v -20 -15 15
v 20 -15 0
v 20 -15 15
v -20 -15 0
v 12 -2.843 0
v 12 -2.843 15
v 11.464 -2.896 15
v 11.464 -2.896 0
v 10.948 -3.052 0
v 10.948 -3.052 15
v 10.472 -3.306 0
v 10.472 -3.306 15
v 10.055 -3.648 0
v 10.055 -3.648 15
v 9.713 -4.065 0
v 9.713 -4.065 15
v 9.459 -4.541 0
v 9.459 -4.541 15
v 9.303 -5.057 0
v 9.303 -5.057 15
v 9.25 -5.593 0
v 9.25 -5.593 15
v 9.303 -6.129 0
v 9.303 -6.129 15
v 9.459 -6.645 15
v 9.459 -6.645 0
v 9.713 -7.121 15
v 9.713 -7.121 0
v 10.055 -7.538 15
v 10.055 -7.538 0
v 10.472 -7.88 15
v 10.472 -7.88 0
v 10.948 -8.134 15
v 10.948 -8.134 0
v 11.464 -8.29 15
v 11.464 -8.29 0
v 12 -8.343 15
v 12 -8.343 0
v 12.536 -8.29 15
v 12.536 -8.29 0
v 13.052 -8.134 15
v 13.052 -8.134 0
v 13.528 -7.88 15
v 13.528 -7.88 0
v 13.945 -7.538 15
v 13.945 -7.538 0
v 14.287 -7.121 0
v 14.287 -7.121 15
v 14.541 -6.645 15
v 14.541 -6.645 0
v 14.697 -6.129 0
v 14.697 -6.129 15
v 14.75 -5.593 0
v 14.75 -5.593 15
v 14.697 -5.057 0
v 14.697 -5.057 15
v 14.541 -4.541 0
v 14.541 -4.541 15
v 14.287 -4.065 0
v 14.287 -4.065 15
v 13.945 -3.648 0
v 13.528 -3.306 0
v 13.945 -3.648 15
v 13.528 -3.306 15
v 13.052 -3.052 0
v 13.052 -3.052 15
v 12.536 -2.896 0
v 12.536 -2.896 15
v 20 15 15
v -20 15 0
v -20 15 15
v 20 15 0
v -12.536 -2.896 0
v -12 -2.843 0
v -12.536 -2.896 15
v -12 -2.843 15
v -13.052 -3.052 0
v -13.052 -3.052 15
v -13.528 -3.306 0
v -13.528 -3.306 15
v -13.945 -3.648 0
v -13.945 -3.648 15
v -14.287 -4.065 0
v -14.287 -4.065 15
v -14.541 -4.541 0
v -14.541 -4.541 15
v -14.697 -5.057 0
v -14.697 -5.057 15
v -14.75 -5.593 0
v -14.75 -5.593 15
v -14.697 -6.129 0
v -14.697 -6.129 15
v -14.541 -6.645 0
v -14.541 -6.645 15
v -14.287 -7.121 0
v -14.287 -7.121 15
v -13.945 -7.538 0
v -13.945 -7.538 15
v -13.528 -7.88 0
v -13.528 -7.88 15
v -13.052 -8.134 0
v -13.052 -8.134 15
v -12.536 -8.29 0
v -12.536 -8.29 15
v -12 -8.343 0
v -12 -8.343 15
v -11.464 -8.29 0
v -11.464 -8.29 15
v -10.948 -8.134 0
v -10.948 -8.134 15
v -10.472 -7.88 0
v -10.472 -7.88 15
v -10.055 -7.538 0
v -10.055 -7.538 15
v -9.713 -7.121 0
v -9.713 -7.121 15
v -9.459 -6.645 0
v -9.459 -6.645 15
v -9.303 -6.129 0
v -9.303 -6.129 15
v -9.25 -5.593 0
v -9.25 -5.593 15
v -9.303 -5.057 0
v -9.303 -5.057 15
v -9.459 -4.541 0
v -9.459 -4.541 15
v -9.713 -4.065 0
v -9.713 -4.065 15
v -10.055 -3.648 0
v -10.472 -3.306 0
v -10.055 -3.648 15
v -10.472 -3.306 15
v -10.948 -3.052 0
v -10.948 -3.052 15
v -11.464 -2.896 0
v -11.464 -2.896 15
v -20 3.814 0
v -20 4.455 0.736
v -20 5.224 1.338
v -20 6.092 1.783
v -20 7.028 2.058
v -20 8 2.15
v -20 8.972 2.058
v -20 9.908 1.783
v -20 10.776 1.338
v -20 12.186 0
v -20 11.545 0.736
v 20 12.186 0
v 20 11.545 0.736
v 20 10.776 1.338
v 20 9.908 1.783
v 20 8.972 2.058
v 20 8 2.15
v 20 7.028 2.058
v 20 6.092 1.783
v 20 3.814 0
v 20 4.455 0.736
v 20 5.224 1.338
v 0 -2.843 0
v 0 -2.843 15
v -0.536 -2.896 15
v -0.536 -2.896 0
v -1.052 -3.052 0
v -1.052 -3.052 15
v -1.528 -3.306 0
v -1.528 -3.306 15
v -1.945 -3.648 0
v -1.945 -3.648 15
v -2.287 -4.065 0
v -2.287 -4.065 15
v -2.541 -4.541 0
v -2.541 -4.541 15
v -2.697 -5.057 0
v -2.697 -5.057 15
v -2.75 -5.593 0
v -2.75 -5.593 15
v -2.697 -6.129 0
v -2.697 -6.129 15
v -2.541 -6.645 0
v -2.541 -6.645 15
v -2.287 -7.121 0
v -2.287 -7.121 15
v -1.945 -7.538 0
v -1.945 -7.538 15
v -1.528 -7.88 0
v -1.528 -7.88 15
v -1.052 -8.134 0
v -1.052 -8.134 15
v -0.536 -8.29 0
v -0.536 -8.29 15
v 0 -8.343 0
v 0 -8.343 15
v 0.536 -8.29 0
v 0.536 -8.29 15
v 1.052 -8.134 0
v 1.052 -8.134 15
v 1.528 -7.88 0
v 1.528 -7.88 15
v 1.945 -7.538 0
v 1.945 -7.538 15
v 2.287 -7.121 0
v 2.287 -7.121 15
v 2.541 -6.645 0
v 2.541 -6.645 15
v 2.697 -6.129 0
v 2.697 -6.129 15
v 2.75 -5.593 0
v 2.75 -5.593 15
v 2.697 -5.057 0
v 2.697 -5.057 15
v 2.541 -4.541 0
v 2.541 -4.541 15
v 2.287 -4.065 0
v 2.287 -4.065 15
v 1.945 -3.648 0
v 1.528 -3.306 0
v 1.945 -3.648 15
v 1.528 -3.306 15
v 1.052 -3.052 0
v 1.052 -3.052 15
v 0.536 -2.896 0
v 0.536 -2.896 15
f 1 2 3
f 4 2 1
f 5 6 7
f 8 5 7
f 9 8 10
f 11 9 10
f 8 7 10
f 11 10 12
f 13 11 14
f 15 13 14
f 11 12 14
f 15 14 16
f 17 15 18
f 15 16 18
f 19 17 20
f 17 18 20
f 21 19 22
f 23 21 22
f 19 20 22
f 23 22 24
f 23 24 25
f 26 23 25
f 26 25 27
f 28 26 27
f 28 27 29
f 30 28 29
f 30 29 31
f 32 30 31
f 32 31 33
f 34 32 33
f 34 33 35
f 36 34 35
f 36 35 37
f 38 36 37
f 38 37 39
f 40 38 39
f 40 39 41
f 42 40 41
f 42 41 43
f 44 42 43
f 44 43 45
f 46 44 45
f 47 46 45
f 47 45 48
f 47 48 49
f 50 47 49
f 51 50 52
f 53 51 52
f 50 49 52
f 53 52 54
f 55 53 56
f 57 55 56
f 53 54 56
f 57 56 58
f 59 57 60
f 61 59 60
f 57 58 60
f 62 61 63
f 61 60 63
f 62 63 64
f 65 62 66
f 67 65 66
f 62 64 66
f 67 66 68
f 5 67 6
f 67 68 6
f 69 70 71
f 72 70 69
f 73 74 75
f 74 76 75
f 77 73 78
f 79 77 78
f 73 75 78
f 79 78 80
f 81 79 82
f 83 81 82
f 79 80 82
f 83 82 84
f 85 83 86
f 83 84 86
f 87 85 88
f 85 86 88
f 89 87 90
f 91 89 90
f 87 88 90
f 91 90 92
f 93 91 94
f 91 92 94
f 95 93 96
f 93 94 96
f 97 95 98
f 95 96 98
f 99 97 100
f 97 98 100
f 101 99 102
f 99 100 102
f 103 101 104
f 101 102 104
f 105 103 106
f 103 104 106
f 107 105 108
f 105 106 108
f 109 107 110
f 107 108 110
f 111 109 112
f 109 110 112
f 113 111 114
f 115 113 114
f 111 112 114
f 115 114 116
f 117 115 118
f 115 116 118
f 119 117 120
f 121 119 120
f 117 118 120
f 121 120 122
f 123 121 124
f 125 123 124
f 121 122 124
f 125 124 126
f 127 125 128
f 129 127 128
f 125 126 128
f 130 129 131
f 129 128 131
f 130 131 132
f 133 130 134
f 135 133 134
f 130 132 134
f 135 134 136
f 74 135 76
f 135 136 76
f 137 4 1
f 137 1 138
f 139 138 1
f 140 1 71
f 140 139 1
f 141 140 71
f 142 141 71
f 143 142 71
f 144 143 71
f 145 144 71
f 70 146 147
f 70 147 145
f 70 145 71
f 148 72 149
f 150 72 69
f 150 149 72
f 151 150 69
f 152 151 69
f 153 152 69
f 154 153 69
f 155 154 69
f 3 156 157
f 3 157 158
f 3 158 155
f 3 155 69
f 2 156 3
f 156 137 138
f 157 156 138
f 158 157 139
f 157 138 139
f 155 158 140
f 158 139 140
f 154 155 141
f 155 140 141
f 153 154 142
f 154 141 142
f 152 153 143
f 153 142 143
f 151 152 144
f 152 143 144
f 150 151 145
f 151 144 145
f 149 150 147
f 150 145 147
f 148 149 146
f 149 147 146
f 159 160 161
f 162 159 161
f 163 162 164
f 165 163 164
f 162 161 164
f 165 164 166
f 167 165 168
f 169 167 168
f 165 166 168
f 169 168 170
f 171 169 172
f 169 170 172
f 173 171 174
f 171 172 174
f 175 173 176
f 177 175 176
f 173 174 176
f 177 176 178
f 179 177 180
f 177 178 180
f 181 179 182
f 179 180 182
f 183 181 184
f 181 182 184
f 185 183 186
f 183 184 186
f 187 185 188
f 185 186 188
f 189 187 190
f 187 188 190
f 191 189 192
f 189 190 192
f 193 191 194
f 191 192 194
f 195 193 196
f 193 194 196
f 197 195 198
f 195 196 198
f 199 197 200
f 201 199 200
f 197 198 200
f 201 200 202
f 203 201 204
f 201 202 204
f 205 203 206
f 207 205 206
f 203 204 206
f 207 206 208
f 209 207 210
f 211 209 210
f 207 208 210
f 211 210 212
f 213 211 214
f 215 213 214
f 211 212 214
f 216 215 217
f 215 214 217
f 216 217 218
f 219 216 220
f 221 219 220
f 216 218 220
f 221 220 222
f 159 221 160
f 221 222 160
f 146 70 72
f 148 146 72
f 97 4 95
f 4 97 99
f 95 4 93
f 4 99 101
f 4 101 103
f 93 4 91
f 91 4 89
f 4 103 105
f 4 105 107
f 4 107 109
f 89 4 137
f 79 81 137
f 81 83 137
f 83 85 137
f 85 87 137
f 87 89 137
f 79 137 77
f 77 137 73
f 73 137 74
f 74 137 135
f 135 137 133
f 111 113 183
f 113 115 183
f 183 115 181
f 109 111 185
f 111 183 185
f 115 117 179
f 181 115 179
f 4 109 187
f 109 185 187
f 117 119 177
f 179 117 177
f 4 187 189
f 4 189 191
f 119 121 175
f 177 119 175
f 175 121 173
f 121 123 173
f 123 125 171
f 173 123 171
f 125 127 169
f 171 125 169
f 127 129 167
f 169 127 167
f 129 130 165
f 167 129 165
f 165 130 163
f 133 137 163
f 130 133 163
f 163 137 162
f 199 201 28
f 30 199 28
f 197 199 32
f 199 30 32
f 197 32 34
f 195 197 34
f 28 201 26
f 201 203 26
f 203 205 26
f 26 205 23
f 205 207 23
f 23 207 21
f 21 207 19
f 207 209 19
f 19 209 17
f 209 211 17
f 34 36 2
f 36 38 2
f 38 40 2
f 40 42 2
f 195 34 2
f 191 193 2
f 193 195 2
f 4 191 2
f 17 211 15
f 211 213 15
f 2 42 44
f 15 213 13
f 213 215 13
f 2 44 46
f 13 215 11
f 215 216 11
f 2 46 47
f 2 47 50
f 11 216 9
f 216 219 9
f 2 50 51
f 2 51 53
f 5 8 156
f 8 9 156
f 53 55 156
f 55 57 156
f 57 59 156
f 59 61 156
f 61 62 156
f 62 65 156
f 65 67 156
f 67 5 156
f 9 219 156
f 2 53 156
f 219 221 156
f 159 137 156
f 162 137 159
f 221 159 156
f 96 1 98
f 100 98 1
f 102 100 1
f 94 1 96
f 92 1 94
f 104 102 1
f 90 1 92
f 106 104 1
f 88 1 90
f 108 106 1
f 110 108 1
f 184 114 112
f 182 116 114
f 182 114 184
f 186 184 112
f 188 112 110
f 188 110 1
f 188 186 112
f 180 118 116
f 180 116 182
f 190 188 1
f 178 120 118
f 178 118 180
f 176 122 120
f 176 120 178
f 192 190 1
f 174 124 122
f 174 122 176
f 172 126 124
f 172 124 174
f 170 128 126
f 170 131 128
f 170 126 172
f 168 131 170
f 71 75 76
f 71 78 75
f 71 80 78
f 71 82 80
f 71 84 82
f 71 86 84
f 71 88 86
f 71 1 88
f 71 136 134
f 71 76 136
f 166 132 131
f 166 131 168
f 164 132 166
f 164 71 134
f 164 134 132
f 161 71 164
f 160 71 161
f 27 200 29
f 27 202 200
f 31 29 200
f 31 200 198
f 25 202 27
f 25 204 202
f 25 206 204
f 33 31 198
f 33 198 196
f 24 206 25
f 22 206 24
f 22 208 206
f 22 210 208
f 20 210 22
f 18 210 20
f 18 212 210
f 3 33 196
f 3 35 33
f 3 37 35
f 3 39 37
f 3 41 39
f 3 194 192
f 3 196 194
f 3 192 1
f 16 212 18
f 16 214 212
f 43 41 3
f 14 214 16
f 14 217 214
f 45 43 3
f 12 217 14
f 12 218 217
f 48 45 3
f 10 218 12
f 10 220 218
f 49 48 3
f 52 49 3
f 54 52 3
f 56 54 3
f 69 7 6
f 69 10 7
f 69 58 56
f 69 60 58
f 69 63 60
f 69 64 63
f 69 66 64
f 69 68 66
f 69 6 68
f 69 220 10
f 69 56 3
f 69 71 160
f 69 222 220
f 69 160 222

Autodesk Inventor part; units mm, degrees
ref_plane "YZ Plane" through (0, 0, 0) normal (1, 0, 0) x (0, 1, 0)
ref_plane "XZ Plane" through (0, 0, 0) normal (0, 1, 0) x (-1, 0, 0)
ref_plane "XY Plane" through (0, 0, 0) normal (0, 0, 1) x (1, 0, 0)
sketch "Sketch1" plane through (0, 0, 0) normal (0, 0, 1) x (1, 0, 0)
  line L0 (-20, 15) -> (20, 15)
  line L1 (20, 15) -> (20, -15)
  line L2 (20, -15) -> (-20, -15)
  line L3 (-20, -15) -> (-20, 15)
  point P0 (0, 0)
  point P1 (-20, 0)
  point P2 (0, 15)
  dimension "d0" = 30
  dimension "d1" = 40
extrude "Extrusion1" add sketch "Sketch1" along normal blind 15
sketch "Sketch2" plane through (-20, -15, 0) normal (-1, 0, 0) x (0, 0, 1)
  circle A0 centre (-3, 23) radius 5.15
  line L0 (0, 30) -> (0, 0) projected
  line L1 (0, 0) -> (15, 0) projected
  point P0 (0, 15)
  point P1 (0, 15)
  dimension "d5" = 10.3
  dimension "d17" = 23
  dimension "d18" = 3
extrude "Extrusion2" cut sketch "Sketch2" against normal through all
sketch "Sketch3" plane through (0, 0, 0) normal (0, 0, -1) x (-1, 0, 0)
  line L0 (-20, -15) -> (-20, 15) projected
  line L1 (-20, -15) -> (-20, 3.814) projected
  line L2 (20, -15) -> (-20, -15) projected
  line L3 (-20, 15) -> (20, 15) projected
  line L4 (20, 3.814) -> (20, -15) projected
  point P0 (0, 0)
  point P1 (-12, -5.593)
  point P2 (-20, 0)
  point P3 (-20, 12.186)
  point P4 (-20, -5.593)
  point P5 (0, 15)
  point P6 (0, -5.593)
  point P7 (12, -5.593)
  dimension "d19" = 8
  dimension "d20" = 8
hole "Hole1" at (12, -5.593, 0) at (0, -5.593, 0) at (-12, -5.593, 0) direction (0, 0, 1) diameter 5.5 end through all
equation "\"d20\" = d19"
properties part number "0008-10-011 Fixare AxaX Mijloc"
